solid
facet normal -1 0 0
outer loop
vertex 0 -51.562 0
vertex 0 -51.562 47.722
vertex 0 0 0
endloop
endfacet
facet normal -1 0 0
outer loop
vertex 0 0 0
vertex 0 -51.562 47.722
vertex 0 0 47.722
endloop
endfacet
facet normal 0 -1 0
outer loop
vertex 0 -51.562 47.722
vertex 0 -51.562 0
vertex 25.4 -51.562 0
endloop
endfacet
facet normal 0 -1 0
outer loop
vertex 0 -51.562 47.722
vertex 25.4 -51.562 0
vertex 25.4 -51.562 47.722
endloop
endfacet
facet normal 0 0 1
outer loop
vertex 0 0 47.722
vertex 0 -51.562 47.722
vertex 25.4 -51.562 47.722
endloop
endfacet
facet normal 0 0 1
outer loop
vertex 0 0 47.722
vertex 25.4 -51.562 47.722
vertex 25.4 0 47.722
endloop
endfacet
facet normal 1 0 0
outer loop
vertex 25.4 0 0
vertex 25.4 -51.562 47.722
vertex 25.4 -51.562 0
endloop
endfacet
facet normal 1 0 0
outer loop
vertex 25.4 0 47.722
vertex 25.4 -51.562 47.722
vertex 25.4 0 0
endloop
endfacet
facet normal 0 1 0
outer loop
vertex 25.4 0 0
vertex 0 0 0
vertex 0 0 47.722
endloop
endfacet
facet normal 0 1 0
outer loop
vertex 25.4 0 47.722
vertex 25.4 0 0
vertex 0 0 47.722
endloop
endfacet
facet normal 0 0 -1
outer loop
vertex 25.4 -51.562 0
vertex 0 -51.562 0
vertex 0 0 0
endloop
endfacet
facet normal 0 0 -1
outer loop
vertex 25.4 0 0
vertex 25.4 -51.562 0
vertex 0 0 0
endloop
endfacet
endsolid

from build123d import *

# Parameters (mm, degrees)
F0_W     = 51.561747
F0_H     = 47.722045
F1_DEPTH = 25.4
F2_R     = 8.425321
F3_DEPTH = 25.4
F4_R     = 6.442108
F5_DEPTH = 25.4


with BuildPart() as f1:
    # F0 (on Right) → F1 (new body)
    with BuildSketch(Plane.YZ):
        with Locations((-25.780873, 23.861023)):
            Rectangle(F0_W, F0_H)
    extrude(amount=F1_DEPTH)

    # F2 (on face) → F3 (join)
    with BuildSketch(Plane.YZ.offset(25.4)):
        with Locations((-22.977702, 24.120137)):
            Circle(F2_R)
    extrude(amount=-F3_DEPTH)

    # F4 (on face) → F5 (cut)
    with BuildSketch(Plane.YZ.offset(25.4)):
        with Locations((-25.679082, 25.233068)):
            Circle(F4_R)
    extrude(amount=F5_DEPTH, mode=Mode.SUBTRACT)


solid = f1.part
